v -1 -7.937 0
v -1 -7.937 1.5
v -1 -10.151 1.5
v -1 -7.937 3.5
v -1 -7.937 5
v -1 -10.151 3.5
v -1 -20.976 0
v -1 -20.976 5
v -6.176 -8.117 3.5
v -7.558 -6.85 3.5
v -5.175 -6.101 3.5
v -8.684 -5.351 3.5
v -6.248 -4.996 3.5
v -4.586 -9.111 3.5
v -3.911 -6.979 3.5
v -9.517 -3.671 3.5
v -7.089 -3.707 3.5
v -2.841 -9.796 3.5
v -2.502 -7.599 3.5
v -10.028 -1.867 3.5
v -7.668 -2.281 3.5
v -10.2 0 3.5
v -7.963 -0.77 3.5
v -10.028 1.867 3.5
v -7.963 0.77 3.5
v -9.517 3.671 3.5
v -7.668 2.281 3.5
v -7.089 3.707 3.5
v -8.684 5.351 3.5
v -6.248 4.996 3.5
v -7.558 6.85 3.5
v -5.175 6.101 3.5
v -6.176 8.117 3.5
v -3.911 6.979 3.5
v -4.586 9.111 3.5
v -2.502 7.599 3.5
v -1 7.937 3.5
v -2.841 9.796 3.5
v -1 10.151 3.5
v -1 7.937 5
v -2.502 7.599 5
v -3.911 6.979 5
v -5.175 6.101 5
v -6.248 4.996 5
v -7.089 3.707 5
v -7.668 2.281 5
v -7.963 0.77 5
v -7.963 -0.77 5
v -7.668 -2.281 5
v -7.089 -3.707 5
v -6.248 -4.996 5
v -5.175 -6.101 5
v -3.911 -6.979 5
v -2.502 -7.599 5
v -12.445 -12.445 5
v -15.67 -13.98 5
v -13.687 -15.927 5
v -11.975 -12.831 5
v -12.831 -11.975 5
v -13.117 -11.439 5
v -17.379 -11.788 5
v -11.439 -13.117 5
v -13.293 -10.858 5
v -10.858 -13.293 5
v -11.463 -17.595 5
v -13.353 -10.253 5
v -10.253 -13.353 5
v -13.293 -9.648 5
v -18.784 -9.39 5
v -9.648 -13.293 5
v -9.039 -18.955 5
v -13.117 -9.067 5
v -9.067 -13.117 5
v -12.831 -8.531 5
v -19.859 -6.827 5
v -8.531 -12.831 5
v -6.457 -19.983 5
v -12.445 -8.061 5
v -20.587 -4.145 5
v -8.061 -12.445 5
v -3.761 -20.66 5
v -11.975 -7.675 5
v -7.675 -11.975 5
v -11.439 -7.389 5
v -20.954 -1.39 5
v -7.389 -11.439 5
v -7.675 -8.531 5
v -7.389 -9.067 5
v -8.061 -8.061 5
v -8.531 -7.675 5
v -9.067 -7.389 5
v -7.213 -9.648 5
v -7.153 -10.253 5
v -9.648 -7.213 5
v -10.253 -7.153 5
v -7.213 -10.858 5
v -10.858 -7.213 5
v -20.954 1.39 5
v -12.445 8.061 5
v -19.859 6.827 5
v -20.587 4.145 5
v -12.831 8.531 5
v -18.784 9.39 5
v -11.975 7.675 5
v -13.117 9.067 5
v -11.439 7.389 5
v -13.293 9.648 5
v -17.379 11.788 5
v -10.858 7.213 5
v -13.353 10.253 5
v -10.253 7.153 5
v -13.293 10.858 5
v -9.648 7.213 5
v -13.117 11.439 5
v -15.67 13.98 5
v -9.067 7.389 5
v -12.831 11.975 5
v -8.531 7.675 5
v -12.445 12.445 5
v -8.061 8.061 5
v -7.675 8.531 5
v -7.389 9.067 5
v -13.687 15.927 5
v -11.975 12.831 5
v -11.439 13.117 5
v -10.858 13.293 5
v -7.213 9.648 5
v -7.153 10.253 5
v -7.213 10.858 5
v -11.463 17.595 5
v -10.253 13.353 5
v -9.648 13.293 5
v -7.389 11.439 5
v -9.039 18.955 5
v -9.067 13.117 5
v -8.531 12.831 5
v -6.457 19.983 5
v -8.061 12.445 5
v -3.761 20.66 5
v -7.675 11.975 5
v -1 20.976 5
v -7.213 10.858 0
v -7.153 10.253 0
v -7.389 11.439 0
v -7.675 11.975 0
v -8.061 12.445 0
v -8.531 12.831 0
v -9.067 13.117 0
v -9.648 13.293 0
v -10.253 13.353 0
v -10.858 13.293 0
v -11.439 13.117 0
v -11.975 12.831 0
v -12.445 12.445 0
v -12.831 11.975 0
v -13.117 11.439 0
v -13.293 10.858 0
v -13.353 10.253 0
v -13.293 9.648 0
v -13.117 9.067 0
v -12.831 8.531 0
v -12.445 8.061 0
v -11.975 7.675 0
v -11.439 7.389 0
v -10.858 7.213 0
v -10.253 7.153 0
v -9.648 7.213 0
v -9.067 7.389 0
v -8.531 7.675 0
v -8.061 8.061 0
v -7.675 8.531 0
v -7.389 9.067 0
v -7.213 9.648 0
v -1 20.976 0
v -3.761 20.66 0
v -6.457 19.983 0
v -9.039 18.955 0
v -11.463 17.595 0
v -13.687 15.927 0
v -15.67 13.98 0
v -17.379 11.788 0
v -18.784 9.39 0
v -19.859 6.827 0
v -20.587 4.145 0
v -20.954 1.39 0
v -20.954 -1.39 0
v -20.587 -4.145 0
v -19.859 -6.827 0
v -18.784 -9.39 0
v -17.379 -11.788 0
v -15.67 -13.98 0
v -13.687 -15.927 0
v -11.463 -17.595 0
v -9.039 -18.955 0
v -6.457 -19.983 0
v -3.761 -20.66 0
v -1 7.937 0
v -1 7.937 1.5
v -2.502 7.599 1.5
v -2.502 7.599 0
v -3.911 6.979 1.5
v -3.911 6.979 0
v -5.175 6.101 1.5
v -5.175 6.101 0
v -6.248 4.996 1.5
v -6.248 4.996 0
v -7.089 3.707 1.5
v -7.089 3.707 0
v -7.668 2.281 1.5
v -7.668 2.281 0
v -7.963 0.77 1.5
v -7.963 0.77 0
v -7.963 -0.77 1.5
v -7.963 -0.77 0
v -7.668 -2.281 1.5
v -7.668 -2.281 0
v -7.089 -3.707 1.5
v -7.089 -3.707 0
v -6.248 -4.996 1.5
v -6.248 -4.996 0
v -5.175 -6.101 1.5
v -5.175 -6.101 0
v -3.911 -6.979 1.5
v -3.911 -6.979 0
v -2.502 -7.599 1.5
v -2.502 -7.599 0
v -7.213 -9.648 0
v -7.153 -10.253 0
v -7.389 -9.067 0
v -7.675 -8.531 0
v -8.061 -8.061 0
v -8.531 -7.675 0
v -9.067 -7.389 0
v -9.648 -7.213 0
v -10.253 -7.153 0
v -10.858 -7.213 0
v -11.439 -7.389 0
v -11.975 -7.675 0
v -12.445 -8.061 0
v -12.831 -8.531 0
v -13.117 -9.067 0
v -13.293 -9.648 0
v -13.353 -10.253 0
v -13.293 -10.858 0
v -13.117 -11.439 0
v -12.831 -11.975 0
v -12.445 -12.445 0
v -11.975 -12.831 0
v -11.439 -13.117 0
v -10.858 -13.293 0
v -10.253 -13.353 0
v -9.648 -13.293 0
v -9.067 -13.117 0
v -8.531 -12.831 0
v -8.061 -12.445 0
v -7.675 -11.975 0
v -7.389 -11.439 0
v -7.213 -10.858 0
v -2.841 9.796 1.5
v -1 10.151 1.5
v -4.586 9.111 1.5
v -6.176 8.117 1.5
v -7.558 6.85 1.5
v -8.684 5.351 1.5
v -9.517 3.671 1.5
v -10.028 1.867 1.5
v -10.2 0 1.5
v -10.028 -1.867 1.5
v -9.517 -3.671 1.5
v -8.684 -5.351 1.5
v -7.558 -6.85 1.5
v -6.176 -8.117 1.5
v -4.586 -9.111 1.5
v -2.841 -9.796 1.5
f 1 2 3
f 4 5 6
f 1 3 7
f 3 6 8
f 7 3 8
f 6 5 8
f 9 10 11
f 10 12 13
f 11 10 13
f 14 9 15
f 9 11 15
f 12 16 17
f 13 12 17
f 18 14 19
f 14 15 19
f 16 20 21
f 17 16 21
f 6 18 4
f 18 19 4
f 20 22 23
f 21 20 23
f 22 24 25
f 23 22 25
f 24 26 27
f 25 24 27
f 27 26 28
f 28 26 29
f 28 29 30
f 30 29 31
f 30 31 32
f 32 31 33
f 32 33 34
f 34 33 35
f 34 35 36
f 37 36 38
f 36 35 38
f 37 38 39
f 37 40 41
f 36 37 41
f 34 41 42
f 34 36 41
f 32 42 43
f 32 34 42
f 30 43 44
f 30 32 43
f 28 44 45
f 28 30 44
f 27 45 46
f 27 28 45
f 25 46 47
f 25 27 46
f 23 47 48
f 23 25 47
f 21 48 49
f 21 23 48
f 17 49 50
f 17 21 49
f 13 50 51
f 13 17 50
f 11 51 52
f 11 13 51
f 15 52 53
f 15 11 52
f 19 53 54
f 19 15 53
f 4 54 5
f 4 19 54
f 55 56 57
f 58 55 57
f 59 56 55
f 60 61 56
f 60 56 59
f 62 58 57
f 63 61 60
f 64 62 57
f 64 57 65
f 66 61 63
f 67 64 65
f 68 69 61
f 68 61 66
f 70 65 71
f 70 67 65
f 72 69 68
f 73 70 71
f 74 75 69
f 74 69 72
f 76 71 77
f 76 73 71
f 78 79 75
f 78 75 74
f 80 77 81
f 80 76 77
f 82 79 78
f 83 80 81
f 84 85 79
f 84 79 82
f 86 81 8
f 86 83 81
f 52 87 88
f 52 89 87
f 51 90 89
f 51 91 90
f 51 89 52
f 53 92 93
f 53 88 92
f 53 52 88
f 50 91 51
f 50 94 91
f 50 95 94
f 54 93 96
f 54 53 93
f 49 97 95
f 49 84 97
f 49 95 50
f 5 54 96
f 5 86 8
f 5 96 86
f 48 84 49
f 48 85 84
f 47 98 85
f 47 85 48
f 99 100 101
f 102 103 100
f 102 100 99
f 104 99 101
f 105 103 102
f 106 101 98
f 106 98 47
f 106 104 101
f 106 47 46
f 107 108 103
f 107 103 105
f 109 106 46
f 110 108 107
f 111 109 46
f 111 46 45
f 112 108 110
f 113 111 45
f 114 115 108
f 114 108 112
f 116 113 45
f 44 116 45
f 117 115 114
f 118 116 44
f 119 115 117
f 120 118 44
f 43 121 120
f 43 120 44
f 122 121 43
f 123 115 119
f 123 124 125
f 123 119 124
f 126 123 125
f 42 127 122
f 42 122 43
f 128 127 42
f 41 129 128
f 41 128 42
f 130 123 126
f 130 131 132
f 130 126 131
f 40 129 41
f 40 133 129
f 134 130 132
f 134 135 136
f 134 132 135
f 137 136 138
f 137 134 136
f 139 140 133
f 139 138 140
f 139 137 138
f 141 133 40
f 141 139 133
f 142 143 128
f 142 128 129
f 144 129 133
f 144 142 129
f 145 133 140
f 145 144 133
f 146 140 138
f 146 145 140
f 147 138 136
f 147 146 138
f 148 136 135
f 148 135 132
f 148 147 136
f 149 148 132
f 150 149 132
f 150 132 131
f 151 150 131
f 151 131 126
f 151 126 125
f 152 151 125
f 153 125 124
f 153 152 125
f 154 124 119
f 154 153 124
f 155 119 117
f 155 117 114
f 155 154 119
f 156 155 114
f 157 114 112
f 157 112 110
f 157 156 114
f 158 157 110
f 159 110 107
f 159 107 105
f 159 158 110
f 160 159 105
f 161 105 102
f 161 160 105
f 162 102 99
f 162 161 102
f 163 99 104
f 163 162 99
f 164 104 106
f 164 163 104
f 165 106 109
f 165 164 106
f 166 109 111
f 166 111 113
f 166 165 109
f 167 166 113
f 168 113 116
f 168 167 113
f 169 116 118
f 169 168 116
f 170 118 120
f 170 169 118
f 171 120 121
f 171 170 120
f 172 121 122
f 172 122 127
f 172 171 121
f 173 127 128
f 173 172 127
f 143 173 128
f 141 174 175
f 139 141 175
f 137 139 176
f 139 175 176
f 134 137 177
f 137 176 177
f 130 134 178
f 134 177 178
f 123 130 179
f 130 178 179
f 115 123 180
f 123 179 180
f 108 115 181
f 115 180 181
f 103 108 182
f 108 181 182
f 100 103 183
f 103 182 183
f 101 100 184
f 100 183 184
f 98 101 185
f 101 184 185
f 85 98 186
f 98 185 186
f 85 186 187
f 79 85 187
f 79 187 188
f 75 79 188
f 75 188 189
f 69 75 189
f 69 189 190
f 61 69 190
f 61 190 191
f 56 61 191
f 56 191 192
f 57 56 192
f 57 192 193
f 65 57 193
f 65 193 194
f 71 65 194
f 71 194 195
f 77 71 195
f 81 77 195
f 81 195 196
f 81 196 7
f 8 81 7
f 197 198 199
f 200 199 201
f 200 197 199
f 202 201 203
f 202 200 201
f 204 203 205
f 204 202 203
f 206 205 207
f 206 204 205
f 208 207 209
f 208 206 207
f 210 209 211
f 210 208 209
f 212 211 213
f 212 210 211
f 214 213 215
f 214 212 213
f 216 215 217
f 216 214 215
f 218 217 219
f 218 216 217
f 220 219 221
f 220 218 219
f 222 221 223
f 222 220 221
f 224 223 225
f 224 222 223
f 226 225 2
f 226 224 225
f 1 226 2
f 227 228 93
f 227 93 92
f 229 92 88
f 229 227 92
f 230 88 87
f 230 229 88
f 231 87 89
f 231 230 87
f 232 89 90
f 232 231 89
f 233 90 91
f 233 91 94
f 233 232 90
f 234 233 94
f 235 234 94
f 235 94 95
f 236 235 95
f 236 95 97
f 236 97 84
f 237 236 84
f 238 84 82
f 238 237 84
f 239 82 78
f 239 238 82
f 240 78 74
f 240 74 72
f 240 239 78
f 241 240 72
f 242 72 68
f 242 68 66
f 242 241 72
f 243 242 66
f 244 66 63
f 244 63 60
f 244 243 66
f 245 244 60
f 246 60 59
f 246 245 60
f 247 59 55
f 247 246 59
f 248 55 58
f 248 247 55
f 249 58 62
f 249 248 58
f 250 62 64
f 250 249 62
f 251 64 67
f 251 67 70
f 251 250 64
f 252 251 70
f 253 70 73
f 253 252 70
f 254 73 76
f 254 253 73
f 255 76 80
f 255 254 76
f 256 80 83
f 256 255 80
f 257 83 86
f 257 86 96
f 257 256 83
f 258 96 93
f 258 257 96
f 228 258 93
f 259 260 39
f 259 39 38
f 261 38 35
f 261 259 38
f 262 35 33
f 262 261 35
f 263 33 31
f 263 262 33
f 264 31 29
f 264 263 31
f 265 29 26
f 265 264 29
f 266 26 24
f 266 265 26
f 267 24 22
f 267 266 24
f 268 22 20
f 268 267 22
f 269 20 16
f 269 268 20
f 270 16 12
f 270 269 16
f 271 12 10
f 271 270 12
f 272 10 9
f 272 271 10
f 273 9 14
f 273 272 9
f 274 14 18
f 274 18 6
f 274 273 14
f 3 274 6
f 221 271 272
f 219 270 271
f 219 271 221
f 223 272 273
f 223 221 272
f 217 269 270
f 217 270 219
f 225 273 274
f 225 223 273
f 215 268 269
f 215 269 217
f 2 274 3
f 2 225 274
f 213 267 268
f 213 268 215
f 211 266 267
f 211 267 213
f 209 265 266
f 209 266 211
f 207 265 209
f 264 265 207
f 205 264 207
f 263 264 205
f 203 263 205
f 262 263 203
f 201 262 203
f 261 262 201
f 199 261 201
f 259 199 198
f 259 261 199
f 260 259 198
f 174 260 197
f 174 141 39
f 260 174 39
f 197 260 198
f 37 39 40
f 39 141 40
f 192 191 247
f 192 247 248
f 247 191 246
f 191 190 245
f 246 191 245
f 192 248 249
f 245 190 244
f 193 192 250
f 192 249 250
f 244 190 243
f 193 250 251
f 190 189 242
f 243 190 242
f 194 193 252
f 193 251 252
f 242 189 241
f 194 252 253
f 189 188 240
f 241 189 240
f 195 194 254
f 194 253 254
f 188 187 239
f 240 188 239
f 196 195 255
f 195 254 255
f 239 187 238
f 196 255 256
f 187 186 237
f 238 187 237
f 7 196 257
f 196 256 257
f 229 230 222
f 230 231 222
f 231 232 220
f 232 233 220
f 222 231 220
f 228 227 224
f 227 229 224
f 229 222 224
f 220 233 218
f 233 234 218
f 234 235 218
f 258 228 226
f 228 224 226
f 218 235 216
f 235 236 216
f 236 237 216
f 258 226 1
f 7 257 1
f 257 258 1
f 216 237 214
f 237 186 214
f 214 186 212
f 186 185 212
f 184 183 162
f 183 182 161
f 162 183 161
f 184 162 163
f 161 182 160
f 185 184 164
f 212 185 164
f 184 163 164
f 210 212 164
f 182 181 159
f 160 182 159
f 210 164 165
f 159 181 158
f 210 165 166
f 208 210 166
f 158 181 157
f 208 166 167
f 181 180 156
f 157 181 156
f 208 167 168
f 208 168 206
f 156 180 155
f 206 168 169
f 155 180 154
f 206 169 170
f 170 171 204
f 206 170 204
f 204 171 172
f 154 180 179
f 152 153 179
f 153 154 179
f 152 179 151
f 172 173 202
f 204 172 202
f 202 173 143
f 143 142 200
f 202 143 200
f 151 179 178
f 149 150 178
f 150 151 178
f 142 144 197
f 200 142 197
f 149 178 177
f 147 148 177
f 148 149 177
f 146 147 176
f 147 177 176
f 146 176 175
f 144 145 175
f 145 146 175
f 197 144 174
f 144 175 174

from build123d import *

# Parameters (mm, degrees)
SKETCH_1_R          = 21
SKETCH_1_R_2        = 3.1
SKETCH_1_R_3        = 8
EXTRUDE_1_DEPTH     = 5
CUT_EXTRUDE_1_DEPTH = 10
SKETCH_3_W          = 2
SKETCH_3_H          = 1.455022594
CUT_EXTRUDE_2_DEPTH = 2
SKETCH_4_R          = 10.2
CUT_EXTRUDE_3_DEPTH = 2


with BuildPart() as part:
    # 草图1 → 凸台-拉伸1 (new body)
    with BuildSketch(Plane.XY):
        Circle(SKETCH_1_R)
        with Locations((-10.253048327, 10.253048327)):
            Circle(SKETCH_1_R_2, mode=Mode.SUBTRACT)
        with Locations((10.253048327, 10.253048327)):
            Circle(SKETCH_1_R_2, mode=Mode.SUBTRACT)
        with Locations((-10.253048327, -10.253048327)):
            Circle(SKETCH_1_R_2, mode=Mode.SUBTRACT)
        with Locations((10.253048327, -10.253048327)):
            Circle(SKETCH_1_R_2, mode=Mode.SUBTRACT)
        Circle(SKETCH_1_R_3, mode=Mode.SUBTRACT)
    extrude(amount=EXTRUDE_1_DEPTH)

    # 草图2 → 切除-拉伸1 (cut)
    with BuildSketch(Plane.XY.offset(5)):
        Polygon((-1, 0), (-1, 23.542037427), (27.759132826, 23.542037427), (27.759132826, -27.308763415), (-1, -27.308763415), align=None)
    extrude(amount=-CUT_EXTRUDE_1_DEPTH, mode=Mode.SUBTRACT)

    # 草图3 → 切除-拉伸2 (cut)
    with BuildSketch(Plane(origin=(-1, 0, 0), x_dir=(0, 0, -1), z_dir=(1, 0, 0))):
        with Locations((-2.5, 7.937253933)):
            Rectangle(SKETCH_3_W, SKETCH_3_H)
    extrude(amount=-CUT_EXTRUDE_2_DEPTH, mode=Mode.SUBTRACT)

    # 草图4 → 切除-拉伸3 (cut)
    with BuildSketch(Plane.XY.offset(1.5)):
        Circle(SKETCH_4_R)
    extrude(amount=CUT_EXTRUDE_3_DEPTH, mode=Mode.SUBTRACT)


solid = part.part
